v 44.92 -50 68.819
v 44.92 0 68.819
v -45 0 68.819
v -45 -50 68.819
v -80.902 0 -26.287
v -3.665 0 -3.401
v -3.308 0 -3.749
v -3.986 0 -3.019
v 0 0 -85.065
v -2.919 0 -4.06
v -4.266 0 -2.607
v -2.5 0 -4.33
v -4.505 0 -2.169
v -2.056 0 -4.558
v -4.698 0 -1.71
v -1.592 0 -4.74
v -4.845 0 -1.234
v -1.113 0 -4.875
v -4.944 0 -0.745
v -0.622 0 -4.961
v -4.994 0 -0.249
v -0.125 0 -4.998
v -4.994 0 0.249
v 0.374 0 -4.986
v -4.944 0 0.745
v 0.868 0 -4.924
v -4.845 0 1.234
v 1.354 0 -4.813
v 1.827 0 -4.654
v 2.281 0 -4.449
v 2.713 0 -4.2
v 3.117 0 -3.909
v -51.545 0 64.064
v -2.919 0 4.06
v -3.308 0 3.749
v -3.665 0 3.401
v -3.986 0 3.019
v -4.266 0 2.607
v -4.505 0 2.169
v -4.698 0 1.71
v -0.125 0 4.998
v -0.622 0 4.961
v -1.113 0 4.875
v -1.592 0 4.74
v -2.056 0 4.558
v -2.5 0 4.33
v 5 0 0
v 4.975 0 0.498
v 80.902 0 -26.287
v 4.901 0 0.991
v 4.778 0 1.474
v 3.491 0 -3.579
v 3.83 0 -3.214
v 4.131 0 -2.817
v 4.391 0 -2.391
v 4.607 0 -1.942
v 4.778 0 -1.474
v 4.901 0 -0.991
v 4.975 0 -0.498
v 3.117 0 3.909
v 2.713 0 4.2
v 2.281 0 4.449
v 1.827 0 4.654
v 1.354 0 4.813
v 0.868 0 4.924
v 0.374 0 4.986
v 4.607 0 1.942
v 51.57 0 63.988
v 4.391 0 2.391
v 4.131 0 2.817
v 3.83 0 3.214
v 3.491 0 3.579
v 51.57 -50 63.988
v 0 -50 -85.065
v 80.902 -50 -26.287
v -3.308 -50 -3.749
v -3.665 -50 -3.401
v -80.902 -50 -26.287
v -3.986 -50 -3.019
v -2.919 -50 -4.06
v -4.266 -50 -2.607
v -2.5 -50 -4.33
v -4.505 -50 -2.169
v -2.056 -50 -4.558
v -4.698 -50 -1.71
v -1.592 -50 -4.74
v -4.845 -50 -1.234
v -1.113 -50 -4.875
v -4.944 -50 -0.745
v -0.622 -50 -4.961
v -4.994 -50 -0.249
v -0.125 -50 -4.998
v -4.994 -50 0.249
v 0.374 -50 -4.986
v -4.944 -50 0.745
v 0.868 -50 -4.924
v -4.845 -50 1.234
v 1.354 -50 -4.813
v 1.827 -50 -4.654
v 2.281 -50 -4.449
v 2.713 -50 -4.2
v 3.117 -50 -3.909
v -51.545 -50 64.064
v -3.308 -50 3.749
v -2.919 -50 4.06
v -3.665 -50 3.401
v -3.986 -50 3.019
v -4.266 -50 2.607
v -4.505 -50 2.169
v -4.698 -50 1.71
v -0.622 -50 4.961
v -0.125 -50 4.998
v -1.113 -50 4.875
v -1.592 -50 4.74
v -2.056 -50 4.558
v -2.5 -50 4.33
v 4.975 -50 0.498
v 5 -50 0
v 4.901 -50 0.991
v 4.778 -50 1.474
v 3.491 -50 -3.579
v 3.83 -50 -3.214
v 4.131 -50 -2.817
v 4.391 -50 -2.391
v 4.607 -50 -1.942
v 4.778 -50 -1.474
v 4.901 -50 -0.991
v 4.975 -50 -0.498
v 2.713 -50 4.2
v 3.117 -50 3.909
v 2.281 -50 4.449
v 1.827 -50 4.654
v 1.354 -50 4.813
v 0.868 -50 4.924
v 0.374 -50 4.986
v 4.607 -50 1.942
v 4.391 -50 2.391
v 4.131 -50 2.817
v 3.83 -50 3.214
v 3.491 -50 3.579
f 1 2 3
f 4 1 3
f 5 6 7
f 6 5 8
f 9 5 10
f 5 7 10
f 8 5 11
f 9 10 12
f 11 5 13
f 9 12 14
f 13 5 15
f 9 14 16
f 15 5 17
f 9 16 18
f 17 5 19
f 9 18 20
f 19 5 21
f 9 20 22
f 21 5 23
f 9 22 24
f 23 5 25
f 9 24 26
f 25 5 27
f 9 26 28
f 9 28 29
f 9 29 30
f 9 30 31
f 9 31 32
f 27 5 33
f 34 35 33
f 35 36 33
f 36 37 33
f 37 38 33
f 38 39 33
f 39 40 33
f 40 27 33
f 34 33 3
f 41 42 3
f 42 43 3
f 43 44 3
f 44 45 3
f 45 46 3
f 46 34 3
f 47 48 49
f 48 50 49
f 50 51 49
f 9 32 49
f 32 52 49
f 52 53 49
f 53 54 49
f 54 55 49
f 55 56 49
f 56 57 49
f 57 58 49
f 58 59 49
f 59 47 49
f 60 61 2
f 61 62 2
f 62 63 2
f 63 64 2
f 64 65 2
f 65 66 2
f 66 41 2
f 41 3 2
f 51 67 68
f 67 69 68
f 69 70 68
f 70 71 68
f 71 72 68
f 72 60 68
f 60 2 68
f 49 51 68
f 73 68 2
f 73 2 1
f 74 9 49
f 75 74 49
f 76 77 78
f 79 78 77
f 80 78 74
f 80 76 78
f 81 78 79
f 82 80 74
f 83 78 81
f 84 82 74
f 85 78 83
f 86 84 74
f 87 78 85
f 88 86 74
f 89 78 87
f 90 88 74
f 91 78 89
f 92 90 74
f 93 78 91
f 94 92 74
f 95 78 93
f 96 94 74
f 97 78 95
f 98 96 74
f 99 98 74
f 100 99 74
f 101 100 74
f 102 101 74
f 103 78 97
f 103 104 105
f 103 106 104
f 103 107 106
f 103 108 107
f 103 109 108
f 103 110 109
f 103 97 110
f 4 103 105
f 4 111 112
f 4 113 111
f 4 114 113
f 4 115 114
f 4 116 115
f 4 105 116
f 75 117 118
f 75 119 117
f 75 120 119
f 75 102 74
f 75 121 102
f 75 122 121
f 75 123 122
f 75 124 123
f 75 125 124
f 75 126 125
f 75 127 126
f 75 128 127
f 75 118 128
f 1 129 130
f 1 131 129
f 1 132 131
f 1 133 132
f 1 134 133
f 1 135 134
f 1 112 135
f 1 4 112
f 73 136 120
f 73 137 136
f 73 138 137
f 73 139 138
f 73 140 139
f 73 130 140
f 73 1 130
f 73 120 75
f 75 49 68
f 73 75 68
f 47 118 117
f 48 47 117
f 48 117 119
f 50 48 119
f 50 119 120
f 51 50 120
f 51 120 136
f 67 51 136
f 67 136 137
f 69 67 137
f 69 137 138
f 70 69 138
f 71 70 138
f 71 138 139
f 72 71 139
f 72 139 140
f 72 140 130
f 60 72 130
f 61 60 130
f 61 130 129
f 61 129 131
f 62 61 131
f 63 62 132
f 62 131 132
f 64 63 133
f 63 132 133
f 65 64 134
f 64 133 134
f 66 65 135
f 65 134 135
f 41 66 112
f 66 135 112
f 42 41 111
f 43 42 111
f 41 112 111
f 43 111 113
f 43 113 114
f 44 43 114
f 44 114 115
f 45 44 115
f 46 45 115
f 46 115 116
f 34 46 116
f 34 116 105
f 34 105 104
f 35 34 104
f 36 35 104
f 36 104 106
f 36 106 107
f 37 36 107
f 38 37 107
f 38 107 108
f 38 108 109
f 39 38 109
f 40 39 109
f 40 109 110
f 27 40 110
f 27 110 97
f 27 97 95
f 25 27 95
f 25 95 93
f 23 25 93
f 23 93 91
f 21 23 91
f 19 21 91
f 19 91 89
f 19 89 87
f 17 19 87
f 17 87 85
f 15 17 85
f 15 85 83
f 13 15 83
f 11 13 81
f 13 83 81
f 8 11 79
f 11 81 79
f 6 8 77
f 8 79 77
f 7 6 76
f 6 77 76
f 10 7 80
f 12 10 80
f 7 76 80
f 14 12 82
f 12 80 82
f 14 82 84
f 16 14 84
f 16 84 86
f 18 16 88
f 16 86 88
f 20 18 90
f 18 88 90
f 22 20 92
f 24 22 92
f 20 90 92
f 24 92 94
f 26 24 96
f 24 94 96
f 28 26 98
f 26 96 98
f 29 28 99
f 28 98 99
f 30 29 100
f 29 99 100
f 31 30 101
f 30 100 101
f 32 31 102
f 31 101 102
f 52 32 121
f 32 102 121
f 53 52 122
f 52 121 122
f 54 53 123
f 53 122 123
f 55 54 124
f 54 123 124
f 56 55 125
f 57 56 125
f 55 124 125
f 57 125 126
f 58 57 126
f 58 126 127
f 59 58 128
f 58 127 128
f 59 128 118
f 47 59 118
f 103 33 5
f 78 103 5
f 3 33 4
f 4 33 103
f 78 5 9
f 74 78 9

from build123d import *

# Parameters (mm, degrees)
F1_DEPTH = 50
F3_D     = 10
F4_SIZE  = 5
F5_SIZE  = 5.08


with BuildPart() as f1:
    # F0 (on Front) → F1 (new body)
    with BuildSketch(Plane.XZ):
        Polygon((50, 68.819096), (-50, 68.819096), (-80.901699, -26.286556), (0, -85.065081), (80.901699, -26.286556), align=None)
    extrude(amount=F1_DEPTH)

    # F3 (through all)
    with Locations(Plane(origin=(0, 0, 0), x_dir=(-1, 0, 0), z_dir=(0, 1, 0))):
        with Locations((0, 0)):
            Hole(F3_D / 2)

    # F4
    f4_edges = [f1.edges().sort_by_distance(p)[0] for p in [
        (-50, -25, 68.819096),
    ]]
    chamfer(f4_edges, length=F4_SIZE)

    # F5
    f5_edges = [f1.edges().sort_by_distance(p)[0] for p in [
        (50, -25, 68.819096),
    ]]
    chamfer(f5_edges, length=F5_SIZE)


solid = f1.part
